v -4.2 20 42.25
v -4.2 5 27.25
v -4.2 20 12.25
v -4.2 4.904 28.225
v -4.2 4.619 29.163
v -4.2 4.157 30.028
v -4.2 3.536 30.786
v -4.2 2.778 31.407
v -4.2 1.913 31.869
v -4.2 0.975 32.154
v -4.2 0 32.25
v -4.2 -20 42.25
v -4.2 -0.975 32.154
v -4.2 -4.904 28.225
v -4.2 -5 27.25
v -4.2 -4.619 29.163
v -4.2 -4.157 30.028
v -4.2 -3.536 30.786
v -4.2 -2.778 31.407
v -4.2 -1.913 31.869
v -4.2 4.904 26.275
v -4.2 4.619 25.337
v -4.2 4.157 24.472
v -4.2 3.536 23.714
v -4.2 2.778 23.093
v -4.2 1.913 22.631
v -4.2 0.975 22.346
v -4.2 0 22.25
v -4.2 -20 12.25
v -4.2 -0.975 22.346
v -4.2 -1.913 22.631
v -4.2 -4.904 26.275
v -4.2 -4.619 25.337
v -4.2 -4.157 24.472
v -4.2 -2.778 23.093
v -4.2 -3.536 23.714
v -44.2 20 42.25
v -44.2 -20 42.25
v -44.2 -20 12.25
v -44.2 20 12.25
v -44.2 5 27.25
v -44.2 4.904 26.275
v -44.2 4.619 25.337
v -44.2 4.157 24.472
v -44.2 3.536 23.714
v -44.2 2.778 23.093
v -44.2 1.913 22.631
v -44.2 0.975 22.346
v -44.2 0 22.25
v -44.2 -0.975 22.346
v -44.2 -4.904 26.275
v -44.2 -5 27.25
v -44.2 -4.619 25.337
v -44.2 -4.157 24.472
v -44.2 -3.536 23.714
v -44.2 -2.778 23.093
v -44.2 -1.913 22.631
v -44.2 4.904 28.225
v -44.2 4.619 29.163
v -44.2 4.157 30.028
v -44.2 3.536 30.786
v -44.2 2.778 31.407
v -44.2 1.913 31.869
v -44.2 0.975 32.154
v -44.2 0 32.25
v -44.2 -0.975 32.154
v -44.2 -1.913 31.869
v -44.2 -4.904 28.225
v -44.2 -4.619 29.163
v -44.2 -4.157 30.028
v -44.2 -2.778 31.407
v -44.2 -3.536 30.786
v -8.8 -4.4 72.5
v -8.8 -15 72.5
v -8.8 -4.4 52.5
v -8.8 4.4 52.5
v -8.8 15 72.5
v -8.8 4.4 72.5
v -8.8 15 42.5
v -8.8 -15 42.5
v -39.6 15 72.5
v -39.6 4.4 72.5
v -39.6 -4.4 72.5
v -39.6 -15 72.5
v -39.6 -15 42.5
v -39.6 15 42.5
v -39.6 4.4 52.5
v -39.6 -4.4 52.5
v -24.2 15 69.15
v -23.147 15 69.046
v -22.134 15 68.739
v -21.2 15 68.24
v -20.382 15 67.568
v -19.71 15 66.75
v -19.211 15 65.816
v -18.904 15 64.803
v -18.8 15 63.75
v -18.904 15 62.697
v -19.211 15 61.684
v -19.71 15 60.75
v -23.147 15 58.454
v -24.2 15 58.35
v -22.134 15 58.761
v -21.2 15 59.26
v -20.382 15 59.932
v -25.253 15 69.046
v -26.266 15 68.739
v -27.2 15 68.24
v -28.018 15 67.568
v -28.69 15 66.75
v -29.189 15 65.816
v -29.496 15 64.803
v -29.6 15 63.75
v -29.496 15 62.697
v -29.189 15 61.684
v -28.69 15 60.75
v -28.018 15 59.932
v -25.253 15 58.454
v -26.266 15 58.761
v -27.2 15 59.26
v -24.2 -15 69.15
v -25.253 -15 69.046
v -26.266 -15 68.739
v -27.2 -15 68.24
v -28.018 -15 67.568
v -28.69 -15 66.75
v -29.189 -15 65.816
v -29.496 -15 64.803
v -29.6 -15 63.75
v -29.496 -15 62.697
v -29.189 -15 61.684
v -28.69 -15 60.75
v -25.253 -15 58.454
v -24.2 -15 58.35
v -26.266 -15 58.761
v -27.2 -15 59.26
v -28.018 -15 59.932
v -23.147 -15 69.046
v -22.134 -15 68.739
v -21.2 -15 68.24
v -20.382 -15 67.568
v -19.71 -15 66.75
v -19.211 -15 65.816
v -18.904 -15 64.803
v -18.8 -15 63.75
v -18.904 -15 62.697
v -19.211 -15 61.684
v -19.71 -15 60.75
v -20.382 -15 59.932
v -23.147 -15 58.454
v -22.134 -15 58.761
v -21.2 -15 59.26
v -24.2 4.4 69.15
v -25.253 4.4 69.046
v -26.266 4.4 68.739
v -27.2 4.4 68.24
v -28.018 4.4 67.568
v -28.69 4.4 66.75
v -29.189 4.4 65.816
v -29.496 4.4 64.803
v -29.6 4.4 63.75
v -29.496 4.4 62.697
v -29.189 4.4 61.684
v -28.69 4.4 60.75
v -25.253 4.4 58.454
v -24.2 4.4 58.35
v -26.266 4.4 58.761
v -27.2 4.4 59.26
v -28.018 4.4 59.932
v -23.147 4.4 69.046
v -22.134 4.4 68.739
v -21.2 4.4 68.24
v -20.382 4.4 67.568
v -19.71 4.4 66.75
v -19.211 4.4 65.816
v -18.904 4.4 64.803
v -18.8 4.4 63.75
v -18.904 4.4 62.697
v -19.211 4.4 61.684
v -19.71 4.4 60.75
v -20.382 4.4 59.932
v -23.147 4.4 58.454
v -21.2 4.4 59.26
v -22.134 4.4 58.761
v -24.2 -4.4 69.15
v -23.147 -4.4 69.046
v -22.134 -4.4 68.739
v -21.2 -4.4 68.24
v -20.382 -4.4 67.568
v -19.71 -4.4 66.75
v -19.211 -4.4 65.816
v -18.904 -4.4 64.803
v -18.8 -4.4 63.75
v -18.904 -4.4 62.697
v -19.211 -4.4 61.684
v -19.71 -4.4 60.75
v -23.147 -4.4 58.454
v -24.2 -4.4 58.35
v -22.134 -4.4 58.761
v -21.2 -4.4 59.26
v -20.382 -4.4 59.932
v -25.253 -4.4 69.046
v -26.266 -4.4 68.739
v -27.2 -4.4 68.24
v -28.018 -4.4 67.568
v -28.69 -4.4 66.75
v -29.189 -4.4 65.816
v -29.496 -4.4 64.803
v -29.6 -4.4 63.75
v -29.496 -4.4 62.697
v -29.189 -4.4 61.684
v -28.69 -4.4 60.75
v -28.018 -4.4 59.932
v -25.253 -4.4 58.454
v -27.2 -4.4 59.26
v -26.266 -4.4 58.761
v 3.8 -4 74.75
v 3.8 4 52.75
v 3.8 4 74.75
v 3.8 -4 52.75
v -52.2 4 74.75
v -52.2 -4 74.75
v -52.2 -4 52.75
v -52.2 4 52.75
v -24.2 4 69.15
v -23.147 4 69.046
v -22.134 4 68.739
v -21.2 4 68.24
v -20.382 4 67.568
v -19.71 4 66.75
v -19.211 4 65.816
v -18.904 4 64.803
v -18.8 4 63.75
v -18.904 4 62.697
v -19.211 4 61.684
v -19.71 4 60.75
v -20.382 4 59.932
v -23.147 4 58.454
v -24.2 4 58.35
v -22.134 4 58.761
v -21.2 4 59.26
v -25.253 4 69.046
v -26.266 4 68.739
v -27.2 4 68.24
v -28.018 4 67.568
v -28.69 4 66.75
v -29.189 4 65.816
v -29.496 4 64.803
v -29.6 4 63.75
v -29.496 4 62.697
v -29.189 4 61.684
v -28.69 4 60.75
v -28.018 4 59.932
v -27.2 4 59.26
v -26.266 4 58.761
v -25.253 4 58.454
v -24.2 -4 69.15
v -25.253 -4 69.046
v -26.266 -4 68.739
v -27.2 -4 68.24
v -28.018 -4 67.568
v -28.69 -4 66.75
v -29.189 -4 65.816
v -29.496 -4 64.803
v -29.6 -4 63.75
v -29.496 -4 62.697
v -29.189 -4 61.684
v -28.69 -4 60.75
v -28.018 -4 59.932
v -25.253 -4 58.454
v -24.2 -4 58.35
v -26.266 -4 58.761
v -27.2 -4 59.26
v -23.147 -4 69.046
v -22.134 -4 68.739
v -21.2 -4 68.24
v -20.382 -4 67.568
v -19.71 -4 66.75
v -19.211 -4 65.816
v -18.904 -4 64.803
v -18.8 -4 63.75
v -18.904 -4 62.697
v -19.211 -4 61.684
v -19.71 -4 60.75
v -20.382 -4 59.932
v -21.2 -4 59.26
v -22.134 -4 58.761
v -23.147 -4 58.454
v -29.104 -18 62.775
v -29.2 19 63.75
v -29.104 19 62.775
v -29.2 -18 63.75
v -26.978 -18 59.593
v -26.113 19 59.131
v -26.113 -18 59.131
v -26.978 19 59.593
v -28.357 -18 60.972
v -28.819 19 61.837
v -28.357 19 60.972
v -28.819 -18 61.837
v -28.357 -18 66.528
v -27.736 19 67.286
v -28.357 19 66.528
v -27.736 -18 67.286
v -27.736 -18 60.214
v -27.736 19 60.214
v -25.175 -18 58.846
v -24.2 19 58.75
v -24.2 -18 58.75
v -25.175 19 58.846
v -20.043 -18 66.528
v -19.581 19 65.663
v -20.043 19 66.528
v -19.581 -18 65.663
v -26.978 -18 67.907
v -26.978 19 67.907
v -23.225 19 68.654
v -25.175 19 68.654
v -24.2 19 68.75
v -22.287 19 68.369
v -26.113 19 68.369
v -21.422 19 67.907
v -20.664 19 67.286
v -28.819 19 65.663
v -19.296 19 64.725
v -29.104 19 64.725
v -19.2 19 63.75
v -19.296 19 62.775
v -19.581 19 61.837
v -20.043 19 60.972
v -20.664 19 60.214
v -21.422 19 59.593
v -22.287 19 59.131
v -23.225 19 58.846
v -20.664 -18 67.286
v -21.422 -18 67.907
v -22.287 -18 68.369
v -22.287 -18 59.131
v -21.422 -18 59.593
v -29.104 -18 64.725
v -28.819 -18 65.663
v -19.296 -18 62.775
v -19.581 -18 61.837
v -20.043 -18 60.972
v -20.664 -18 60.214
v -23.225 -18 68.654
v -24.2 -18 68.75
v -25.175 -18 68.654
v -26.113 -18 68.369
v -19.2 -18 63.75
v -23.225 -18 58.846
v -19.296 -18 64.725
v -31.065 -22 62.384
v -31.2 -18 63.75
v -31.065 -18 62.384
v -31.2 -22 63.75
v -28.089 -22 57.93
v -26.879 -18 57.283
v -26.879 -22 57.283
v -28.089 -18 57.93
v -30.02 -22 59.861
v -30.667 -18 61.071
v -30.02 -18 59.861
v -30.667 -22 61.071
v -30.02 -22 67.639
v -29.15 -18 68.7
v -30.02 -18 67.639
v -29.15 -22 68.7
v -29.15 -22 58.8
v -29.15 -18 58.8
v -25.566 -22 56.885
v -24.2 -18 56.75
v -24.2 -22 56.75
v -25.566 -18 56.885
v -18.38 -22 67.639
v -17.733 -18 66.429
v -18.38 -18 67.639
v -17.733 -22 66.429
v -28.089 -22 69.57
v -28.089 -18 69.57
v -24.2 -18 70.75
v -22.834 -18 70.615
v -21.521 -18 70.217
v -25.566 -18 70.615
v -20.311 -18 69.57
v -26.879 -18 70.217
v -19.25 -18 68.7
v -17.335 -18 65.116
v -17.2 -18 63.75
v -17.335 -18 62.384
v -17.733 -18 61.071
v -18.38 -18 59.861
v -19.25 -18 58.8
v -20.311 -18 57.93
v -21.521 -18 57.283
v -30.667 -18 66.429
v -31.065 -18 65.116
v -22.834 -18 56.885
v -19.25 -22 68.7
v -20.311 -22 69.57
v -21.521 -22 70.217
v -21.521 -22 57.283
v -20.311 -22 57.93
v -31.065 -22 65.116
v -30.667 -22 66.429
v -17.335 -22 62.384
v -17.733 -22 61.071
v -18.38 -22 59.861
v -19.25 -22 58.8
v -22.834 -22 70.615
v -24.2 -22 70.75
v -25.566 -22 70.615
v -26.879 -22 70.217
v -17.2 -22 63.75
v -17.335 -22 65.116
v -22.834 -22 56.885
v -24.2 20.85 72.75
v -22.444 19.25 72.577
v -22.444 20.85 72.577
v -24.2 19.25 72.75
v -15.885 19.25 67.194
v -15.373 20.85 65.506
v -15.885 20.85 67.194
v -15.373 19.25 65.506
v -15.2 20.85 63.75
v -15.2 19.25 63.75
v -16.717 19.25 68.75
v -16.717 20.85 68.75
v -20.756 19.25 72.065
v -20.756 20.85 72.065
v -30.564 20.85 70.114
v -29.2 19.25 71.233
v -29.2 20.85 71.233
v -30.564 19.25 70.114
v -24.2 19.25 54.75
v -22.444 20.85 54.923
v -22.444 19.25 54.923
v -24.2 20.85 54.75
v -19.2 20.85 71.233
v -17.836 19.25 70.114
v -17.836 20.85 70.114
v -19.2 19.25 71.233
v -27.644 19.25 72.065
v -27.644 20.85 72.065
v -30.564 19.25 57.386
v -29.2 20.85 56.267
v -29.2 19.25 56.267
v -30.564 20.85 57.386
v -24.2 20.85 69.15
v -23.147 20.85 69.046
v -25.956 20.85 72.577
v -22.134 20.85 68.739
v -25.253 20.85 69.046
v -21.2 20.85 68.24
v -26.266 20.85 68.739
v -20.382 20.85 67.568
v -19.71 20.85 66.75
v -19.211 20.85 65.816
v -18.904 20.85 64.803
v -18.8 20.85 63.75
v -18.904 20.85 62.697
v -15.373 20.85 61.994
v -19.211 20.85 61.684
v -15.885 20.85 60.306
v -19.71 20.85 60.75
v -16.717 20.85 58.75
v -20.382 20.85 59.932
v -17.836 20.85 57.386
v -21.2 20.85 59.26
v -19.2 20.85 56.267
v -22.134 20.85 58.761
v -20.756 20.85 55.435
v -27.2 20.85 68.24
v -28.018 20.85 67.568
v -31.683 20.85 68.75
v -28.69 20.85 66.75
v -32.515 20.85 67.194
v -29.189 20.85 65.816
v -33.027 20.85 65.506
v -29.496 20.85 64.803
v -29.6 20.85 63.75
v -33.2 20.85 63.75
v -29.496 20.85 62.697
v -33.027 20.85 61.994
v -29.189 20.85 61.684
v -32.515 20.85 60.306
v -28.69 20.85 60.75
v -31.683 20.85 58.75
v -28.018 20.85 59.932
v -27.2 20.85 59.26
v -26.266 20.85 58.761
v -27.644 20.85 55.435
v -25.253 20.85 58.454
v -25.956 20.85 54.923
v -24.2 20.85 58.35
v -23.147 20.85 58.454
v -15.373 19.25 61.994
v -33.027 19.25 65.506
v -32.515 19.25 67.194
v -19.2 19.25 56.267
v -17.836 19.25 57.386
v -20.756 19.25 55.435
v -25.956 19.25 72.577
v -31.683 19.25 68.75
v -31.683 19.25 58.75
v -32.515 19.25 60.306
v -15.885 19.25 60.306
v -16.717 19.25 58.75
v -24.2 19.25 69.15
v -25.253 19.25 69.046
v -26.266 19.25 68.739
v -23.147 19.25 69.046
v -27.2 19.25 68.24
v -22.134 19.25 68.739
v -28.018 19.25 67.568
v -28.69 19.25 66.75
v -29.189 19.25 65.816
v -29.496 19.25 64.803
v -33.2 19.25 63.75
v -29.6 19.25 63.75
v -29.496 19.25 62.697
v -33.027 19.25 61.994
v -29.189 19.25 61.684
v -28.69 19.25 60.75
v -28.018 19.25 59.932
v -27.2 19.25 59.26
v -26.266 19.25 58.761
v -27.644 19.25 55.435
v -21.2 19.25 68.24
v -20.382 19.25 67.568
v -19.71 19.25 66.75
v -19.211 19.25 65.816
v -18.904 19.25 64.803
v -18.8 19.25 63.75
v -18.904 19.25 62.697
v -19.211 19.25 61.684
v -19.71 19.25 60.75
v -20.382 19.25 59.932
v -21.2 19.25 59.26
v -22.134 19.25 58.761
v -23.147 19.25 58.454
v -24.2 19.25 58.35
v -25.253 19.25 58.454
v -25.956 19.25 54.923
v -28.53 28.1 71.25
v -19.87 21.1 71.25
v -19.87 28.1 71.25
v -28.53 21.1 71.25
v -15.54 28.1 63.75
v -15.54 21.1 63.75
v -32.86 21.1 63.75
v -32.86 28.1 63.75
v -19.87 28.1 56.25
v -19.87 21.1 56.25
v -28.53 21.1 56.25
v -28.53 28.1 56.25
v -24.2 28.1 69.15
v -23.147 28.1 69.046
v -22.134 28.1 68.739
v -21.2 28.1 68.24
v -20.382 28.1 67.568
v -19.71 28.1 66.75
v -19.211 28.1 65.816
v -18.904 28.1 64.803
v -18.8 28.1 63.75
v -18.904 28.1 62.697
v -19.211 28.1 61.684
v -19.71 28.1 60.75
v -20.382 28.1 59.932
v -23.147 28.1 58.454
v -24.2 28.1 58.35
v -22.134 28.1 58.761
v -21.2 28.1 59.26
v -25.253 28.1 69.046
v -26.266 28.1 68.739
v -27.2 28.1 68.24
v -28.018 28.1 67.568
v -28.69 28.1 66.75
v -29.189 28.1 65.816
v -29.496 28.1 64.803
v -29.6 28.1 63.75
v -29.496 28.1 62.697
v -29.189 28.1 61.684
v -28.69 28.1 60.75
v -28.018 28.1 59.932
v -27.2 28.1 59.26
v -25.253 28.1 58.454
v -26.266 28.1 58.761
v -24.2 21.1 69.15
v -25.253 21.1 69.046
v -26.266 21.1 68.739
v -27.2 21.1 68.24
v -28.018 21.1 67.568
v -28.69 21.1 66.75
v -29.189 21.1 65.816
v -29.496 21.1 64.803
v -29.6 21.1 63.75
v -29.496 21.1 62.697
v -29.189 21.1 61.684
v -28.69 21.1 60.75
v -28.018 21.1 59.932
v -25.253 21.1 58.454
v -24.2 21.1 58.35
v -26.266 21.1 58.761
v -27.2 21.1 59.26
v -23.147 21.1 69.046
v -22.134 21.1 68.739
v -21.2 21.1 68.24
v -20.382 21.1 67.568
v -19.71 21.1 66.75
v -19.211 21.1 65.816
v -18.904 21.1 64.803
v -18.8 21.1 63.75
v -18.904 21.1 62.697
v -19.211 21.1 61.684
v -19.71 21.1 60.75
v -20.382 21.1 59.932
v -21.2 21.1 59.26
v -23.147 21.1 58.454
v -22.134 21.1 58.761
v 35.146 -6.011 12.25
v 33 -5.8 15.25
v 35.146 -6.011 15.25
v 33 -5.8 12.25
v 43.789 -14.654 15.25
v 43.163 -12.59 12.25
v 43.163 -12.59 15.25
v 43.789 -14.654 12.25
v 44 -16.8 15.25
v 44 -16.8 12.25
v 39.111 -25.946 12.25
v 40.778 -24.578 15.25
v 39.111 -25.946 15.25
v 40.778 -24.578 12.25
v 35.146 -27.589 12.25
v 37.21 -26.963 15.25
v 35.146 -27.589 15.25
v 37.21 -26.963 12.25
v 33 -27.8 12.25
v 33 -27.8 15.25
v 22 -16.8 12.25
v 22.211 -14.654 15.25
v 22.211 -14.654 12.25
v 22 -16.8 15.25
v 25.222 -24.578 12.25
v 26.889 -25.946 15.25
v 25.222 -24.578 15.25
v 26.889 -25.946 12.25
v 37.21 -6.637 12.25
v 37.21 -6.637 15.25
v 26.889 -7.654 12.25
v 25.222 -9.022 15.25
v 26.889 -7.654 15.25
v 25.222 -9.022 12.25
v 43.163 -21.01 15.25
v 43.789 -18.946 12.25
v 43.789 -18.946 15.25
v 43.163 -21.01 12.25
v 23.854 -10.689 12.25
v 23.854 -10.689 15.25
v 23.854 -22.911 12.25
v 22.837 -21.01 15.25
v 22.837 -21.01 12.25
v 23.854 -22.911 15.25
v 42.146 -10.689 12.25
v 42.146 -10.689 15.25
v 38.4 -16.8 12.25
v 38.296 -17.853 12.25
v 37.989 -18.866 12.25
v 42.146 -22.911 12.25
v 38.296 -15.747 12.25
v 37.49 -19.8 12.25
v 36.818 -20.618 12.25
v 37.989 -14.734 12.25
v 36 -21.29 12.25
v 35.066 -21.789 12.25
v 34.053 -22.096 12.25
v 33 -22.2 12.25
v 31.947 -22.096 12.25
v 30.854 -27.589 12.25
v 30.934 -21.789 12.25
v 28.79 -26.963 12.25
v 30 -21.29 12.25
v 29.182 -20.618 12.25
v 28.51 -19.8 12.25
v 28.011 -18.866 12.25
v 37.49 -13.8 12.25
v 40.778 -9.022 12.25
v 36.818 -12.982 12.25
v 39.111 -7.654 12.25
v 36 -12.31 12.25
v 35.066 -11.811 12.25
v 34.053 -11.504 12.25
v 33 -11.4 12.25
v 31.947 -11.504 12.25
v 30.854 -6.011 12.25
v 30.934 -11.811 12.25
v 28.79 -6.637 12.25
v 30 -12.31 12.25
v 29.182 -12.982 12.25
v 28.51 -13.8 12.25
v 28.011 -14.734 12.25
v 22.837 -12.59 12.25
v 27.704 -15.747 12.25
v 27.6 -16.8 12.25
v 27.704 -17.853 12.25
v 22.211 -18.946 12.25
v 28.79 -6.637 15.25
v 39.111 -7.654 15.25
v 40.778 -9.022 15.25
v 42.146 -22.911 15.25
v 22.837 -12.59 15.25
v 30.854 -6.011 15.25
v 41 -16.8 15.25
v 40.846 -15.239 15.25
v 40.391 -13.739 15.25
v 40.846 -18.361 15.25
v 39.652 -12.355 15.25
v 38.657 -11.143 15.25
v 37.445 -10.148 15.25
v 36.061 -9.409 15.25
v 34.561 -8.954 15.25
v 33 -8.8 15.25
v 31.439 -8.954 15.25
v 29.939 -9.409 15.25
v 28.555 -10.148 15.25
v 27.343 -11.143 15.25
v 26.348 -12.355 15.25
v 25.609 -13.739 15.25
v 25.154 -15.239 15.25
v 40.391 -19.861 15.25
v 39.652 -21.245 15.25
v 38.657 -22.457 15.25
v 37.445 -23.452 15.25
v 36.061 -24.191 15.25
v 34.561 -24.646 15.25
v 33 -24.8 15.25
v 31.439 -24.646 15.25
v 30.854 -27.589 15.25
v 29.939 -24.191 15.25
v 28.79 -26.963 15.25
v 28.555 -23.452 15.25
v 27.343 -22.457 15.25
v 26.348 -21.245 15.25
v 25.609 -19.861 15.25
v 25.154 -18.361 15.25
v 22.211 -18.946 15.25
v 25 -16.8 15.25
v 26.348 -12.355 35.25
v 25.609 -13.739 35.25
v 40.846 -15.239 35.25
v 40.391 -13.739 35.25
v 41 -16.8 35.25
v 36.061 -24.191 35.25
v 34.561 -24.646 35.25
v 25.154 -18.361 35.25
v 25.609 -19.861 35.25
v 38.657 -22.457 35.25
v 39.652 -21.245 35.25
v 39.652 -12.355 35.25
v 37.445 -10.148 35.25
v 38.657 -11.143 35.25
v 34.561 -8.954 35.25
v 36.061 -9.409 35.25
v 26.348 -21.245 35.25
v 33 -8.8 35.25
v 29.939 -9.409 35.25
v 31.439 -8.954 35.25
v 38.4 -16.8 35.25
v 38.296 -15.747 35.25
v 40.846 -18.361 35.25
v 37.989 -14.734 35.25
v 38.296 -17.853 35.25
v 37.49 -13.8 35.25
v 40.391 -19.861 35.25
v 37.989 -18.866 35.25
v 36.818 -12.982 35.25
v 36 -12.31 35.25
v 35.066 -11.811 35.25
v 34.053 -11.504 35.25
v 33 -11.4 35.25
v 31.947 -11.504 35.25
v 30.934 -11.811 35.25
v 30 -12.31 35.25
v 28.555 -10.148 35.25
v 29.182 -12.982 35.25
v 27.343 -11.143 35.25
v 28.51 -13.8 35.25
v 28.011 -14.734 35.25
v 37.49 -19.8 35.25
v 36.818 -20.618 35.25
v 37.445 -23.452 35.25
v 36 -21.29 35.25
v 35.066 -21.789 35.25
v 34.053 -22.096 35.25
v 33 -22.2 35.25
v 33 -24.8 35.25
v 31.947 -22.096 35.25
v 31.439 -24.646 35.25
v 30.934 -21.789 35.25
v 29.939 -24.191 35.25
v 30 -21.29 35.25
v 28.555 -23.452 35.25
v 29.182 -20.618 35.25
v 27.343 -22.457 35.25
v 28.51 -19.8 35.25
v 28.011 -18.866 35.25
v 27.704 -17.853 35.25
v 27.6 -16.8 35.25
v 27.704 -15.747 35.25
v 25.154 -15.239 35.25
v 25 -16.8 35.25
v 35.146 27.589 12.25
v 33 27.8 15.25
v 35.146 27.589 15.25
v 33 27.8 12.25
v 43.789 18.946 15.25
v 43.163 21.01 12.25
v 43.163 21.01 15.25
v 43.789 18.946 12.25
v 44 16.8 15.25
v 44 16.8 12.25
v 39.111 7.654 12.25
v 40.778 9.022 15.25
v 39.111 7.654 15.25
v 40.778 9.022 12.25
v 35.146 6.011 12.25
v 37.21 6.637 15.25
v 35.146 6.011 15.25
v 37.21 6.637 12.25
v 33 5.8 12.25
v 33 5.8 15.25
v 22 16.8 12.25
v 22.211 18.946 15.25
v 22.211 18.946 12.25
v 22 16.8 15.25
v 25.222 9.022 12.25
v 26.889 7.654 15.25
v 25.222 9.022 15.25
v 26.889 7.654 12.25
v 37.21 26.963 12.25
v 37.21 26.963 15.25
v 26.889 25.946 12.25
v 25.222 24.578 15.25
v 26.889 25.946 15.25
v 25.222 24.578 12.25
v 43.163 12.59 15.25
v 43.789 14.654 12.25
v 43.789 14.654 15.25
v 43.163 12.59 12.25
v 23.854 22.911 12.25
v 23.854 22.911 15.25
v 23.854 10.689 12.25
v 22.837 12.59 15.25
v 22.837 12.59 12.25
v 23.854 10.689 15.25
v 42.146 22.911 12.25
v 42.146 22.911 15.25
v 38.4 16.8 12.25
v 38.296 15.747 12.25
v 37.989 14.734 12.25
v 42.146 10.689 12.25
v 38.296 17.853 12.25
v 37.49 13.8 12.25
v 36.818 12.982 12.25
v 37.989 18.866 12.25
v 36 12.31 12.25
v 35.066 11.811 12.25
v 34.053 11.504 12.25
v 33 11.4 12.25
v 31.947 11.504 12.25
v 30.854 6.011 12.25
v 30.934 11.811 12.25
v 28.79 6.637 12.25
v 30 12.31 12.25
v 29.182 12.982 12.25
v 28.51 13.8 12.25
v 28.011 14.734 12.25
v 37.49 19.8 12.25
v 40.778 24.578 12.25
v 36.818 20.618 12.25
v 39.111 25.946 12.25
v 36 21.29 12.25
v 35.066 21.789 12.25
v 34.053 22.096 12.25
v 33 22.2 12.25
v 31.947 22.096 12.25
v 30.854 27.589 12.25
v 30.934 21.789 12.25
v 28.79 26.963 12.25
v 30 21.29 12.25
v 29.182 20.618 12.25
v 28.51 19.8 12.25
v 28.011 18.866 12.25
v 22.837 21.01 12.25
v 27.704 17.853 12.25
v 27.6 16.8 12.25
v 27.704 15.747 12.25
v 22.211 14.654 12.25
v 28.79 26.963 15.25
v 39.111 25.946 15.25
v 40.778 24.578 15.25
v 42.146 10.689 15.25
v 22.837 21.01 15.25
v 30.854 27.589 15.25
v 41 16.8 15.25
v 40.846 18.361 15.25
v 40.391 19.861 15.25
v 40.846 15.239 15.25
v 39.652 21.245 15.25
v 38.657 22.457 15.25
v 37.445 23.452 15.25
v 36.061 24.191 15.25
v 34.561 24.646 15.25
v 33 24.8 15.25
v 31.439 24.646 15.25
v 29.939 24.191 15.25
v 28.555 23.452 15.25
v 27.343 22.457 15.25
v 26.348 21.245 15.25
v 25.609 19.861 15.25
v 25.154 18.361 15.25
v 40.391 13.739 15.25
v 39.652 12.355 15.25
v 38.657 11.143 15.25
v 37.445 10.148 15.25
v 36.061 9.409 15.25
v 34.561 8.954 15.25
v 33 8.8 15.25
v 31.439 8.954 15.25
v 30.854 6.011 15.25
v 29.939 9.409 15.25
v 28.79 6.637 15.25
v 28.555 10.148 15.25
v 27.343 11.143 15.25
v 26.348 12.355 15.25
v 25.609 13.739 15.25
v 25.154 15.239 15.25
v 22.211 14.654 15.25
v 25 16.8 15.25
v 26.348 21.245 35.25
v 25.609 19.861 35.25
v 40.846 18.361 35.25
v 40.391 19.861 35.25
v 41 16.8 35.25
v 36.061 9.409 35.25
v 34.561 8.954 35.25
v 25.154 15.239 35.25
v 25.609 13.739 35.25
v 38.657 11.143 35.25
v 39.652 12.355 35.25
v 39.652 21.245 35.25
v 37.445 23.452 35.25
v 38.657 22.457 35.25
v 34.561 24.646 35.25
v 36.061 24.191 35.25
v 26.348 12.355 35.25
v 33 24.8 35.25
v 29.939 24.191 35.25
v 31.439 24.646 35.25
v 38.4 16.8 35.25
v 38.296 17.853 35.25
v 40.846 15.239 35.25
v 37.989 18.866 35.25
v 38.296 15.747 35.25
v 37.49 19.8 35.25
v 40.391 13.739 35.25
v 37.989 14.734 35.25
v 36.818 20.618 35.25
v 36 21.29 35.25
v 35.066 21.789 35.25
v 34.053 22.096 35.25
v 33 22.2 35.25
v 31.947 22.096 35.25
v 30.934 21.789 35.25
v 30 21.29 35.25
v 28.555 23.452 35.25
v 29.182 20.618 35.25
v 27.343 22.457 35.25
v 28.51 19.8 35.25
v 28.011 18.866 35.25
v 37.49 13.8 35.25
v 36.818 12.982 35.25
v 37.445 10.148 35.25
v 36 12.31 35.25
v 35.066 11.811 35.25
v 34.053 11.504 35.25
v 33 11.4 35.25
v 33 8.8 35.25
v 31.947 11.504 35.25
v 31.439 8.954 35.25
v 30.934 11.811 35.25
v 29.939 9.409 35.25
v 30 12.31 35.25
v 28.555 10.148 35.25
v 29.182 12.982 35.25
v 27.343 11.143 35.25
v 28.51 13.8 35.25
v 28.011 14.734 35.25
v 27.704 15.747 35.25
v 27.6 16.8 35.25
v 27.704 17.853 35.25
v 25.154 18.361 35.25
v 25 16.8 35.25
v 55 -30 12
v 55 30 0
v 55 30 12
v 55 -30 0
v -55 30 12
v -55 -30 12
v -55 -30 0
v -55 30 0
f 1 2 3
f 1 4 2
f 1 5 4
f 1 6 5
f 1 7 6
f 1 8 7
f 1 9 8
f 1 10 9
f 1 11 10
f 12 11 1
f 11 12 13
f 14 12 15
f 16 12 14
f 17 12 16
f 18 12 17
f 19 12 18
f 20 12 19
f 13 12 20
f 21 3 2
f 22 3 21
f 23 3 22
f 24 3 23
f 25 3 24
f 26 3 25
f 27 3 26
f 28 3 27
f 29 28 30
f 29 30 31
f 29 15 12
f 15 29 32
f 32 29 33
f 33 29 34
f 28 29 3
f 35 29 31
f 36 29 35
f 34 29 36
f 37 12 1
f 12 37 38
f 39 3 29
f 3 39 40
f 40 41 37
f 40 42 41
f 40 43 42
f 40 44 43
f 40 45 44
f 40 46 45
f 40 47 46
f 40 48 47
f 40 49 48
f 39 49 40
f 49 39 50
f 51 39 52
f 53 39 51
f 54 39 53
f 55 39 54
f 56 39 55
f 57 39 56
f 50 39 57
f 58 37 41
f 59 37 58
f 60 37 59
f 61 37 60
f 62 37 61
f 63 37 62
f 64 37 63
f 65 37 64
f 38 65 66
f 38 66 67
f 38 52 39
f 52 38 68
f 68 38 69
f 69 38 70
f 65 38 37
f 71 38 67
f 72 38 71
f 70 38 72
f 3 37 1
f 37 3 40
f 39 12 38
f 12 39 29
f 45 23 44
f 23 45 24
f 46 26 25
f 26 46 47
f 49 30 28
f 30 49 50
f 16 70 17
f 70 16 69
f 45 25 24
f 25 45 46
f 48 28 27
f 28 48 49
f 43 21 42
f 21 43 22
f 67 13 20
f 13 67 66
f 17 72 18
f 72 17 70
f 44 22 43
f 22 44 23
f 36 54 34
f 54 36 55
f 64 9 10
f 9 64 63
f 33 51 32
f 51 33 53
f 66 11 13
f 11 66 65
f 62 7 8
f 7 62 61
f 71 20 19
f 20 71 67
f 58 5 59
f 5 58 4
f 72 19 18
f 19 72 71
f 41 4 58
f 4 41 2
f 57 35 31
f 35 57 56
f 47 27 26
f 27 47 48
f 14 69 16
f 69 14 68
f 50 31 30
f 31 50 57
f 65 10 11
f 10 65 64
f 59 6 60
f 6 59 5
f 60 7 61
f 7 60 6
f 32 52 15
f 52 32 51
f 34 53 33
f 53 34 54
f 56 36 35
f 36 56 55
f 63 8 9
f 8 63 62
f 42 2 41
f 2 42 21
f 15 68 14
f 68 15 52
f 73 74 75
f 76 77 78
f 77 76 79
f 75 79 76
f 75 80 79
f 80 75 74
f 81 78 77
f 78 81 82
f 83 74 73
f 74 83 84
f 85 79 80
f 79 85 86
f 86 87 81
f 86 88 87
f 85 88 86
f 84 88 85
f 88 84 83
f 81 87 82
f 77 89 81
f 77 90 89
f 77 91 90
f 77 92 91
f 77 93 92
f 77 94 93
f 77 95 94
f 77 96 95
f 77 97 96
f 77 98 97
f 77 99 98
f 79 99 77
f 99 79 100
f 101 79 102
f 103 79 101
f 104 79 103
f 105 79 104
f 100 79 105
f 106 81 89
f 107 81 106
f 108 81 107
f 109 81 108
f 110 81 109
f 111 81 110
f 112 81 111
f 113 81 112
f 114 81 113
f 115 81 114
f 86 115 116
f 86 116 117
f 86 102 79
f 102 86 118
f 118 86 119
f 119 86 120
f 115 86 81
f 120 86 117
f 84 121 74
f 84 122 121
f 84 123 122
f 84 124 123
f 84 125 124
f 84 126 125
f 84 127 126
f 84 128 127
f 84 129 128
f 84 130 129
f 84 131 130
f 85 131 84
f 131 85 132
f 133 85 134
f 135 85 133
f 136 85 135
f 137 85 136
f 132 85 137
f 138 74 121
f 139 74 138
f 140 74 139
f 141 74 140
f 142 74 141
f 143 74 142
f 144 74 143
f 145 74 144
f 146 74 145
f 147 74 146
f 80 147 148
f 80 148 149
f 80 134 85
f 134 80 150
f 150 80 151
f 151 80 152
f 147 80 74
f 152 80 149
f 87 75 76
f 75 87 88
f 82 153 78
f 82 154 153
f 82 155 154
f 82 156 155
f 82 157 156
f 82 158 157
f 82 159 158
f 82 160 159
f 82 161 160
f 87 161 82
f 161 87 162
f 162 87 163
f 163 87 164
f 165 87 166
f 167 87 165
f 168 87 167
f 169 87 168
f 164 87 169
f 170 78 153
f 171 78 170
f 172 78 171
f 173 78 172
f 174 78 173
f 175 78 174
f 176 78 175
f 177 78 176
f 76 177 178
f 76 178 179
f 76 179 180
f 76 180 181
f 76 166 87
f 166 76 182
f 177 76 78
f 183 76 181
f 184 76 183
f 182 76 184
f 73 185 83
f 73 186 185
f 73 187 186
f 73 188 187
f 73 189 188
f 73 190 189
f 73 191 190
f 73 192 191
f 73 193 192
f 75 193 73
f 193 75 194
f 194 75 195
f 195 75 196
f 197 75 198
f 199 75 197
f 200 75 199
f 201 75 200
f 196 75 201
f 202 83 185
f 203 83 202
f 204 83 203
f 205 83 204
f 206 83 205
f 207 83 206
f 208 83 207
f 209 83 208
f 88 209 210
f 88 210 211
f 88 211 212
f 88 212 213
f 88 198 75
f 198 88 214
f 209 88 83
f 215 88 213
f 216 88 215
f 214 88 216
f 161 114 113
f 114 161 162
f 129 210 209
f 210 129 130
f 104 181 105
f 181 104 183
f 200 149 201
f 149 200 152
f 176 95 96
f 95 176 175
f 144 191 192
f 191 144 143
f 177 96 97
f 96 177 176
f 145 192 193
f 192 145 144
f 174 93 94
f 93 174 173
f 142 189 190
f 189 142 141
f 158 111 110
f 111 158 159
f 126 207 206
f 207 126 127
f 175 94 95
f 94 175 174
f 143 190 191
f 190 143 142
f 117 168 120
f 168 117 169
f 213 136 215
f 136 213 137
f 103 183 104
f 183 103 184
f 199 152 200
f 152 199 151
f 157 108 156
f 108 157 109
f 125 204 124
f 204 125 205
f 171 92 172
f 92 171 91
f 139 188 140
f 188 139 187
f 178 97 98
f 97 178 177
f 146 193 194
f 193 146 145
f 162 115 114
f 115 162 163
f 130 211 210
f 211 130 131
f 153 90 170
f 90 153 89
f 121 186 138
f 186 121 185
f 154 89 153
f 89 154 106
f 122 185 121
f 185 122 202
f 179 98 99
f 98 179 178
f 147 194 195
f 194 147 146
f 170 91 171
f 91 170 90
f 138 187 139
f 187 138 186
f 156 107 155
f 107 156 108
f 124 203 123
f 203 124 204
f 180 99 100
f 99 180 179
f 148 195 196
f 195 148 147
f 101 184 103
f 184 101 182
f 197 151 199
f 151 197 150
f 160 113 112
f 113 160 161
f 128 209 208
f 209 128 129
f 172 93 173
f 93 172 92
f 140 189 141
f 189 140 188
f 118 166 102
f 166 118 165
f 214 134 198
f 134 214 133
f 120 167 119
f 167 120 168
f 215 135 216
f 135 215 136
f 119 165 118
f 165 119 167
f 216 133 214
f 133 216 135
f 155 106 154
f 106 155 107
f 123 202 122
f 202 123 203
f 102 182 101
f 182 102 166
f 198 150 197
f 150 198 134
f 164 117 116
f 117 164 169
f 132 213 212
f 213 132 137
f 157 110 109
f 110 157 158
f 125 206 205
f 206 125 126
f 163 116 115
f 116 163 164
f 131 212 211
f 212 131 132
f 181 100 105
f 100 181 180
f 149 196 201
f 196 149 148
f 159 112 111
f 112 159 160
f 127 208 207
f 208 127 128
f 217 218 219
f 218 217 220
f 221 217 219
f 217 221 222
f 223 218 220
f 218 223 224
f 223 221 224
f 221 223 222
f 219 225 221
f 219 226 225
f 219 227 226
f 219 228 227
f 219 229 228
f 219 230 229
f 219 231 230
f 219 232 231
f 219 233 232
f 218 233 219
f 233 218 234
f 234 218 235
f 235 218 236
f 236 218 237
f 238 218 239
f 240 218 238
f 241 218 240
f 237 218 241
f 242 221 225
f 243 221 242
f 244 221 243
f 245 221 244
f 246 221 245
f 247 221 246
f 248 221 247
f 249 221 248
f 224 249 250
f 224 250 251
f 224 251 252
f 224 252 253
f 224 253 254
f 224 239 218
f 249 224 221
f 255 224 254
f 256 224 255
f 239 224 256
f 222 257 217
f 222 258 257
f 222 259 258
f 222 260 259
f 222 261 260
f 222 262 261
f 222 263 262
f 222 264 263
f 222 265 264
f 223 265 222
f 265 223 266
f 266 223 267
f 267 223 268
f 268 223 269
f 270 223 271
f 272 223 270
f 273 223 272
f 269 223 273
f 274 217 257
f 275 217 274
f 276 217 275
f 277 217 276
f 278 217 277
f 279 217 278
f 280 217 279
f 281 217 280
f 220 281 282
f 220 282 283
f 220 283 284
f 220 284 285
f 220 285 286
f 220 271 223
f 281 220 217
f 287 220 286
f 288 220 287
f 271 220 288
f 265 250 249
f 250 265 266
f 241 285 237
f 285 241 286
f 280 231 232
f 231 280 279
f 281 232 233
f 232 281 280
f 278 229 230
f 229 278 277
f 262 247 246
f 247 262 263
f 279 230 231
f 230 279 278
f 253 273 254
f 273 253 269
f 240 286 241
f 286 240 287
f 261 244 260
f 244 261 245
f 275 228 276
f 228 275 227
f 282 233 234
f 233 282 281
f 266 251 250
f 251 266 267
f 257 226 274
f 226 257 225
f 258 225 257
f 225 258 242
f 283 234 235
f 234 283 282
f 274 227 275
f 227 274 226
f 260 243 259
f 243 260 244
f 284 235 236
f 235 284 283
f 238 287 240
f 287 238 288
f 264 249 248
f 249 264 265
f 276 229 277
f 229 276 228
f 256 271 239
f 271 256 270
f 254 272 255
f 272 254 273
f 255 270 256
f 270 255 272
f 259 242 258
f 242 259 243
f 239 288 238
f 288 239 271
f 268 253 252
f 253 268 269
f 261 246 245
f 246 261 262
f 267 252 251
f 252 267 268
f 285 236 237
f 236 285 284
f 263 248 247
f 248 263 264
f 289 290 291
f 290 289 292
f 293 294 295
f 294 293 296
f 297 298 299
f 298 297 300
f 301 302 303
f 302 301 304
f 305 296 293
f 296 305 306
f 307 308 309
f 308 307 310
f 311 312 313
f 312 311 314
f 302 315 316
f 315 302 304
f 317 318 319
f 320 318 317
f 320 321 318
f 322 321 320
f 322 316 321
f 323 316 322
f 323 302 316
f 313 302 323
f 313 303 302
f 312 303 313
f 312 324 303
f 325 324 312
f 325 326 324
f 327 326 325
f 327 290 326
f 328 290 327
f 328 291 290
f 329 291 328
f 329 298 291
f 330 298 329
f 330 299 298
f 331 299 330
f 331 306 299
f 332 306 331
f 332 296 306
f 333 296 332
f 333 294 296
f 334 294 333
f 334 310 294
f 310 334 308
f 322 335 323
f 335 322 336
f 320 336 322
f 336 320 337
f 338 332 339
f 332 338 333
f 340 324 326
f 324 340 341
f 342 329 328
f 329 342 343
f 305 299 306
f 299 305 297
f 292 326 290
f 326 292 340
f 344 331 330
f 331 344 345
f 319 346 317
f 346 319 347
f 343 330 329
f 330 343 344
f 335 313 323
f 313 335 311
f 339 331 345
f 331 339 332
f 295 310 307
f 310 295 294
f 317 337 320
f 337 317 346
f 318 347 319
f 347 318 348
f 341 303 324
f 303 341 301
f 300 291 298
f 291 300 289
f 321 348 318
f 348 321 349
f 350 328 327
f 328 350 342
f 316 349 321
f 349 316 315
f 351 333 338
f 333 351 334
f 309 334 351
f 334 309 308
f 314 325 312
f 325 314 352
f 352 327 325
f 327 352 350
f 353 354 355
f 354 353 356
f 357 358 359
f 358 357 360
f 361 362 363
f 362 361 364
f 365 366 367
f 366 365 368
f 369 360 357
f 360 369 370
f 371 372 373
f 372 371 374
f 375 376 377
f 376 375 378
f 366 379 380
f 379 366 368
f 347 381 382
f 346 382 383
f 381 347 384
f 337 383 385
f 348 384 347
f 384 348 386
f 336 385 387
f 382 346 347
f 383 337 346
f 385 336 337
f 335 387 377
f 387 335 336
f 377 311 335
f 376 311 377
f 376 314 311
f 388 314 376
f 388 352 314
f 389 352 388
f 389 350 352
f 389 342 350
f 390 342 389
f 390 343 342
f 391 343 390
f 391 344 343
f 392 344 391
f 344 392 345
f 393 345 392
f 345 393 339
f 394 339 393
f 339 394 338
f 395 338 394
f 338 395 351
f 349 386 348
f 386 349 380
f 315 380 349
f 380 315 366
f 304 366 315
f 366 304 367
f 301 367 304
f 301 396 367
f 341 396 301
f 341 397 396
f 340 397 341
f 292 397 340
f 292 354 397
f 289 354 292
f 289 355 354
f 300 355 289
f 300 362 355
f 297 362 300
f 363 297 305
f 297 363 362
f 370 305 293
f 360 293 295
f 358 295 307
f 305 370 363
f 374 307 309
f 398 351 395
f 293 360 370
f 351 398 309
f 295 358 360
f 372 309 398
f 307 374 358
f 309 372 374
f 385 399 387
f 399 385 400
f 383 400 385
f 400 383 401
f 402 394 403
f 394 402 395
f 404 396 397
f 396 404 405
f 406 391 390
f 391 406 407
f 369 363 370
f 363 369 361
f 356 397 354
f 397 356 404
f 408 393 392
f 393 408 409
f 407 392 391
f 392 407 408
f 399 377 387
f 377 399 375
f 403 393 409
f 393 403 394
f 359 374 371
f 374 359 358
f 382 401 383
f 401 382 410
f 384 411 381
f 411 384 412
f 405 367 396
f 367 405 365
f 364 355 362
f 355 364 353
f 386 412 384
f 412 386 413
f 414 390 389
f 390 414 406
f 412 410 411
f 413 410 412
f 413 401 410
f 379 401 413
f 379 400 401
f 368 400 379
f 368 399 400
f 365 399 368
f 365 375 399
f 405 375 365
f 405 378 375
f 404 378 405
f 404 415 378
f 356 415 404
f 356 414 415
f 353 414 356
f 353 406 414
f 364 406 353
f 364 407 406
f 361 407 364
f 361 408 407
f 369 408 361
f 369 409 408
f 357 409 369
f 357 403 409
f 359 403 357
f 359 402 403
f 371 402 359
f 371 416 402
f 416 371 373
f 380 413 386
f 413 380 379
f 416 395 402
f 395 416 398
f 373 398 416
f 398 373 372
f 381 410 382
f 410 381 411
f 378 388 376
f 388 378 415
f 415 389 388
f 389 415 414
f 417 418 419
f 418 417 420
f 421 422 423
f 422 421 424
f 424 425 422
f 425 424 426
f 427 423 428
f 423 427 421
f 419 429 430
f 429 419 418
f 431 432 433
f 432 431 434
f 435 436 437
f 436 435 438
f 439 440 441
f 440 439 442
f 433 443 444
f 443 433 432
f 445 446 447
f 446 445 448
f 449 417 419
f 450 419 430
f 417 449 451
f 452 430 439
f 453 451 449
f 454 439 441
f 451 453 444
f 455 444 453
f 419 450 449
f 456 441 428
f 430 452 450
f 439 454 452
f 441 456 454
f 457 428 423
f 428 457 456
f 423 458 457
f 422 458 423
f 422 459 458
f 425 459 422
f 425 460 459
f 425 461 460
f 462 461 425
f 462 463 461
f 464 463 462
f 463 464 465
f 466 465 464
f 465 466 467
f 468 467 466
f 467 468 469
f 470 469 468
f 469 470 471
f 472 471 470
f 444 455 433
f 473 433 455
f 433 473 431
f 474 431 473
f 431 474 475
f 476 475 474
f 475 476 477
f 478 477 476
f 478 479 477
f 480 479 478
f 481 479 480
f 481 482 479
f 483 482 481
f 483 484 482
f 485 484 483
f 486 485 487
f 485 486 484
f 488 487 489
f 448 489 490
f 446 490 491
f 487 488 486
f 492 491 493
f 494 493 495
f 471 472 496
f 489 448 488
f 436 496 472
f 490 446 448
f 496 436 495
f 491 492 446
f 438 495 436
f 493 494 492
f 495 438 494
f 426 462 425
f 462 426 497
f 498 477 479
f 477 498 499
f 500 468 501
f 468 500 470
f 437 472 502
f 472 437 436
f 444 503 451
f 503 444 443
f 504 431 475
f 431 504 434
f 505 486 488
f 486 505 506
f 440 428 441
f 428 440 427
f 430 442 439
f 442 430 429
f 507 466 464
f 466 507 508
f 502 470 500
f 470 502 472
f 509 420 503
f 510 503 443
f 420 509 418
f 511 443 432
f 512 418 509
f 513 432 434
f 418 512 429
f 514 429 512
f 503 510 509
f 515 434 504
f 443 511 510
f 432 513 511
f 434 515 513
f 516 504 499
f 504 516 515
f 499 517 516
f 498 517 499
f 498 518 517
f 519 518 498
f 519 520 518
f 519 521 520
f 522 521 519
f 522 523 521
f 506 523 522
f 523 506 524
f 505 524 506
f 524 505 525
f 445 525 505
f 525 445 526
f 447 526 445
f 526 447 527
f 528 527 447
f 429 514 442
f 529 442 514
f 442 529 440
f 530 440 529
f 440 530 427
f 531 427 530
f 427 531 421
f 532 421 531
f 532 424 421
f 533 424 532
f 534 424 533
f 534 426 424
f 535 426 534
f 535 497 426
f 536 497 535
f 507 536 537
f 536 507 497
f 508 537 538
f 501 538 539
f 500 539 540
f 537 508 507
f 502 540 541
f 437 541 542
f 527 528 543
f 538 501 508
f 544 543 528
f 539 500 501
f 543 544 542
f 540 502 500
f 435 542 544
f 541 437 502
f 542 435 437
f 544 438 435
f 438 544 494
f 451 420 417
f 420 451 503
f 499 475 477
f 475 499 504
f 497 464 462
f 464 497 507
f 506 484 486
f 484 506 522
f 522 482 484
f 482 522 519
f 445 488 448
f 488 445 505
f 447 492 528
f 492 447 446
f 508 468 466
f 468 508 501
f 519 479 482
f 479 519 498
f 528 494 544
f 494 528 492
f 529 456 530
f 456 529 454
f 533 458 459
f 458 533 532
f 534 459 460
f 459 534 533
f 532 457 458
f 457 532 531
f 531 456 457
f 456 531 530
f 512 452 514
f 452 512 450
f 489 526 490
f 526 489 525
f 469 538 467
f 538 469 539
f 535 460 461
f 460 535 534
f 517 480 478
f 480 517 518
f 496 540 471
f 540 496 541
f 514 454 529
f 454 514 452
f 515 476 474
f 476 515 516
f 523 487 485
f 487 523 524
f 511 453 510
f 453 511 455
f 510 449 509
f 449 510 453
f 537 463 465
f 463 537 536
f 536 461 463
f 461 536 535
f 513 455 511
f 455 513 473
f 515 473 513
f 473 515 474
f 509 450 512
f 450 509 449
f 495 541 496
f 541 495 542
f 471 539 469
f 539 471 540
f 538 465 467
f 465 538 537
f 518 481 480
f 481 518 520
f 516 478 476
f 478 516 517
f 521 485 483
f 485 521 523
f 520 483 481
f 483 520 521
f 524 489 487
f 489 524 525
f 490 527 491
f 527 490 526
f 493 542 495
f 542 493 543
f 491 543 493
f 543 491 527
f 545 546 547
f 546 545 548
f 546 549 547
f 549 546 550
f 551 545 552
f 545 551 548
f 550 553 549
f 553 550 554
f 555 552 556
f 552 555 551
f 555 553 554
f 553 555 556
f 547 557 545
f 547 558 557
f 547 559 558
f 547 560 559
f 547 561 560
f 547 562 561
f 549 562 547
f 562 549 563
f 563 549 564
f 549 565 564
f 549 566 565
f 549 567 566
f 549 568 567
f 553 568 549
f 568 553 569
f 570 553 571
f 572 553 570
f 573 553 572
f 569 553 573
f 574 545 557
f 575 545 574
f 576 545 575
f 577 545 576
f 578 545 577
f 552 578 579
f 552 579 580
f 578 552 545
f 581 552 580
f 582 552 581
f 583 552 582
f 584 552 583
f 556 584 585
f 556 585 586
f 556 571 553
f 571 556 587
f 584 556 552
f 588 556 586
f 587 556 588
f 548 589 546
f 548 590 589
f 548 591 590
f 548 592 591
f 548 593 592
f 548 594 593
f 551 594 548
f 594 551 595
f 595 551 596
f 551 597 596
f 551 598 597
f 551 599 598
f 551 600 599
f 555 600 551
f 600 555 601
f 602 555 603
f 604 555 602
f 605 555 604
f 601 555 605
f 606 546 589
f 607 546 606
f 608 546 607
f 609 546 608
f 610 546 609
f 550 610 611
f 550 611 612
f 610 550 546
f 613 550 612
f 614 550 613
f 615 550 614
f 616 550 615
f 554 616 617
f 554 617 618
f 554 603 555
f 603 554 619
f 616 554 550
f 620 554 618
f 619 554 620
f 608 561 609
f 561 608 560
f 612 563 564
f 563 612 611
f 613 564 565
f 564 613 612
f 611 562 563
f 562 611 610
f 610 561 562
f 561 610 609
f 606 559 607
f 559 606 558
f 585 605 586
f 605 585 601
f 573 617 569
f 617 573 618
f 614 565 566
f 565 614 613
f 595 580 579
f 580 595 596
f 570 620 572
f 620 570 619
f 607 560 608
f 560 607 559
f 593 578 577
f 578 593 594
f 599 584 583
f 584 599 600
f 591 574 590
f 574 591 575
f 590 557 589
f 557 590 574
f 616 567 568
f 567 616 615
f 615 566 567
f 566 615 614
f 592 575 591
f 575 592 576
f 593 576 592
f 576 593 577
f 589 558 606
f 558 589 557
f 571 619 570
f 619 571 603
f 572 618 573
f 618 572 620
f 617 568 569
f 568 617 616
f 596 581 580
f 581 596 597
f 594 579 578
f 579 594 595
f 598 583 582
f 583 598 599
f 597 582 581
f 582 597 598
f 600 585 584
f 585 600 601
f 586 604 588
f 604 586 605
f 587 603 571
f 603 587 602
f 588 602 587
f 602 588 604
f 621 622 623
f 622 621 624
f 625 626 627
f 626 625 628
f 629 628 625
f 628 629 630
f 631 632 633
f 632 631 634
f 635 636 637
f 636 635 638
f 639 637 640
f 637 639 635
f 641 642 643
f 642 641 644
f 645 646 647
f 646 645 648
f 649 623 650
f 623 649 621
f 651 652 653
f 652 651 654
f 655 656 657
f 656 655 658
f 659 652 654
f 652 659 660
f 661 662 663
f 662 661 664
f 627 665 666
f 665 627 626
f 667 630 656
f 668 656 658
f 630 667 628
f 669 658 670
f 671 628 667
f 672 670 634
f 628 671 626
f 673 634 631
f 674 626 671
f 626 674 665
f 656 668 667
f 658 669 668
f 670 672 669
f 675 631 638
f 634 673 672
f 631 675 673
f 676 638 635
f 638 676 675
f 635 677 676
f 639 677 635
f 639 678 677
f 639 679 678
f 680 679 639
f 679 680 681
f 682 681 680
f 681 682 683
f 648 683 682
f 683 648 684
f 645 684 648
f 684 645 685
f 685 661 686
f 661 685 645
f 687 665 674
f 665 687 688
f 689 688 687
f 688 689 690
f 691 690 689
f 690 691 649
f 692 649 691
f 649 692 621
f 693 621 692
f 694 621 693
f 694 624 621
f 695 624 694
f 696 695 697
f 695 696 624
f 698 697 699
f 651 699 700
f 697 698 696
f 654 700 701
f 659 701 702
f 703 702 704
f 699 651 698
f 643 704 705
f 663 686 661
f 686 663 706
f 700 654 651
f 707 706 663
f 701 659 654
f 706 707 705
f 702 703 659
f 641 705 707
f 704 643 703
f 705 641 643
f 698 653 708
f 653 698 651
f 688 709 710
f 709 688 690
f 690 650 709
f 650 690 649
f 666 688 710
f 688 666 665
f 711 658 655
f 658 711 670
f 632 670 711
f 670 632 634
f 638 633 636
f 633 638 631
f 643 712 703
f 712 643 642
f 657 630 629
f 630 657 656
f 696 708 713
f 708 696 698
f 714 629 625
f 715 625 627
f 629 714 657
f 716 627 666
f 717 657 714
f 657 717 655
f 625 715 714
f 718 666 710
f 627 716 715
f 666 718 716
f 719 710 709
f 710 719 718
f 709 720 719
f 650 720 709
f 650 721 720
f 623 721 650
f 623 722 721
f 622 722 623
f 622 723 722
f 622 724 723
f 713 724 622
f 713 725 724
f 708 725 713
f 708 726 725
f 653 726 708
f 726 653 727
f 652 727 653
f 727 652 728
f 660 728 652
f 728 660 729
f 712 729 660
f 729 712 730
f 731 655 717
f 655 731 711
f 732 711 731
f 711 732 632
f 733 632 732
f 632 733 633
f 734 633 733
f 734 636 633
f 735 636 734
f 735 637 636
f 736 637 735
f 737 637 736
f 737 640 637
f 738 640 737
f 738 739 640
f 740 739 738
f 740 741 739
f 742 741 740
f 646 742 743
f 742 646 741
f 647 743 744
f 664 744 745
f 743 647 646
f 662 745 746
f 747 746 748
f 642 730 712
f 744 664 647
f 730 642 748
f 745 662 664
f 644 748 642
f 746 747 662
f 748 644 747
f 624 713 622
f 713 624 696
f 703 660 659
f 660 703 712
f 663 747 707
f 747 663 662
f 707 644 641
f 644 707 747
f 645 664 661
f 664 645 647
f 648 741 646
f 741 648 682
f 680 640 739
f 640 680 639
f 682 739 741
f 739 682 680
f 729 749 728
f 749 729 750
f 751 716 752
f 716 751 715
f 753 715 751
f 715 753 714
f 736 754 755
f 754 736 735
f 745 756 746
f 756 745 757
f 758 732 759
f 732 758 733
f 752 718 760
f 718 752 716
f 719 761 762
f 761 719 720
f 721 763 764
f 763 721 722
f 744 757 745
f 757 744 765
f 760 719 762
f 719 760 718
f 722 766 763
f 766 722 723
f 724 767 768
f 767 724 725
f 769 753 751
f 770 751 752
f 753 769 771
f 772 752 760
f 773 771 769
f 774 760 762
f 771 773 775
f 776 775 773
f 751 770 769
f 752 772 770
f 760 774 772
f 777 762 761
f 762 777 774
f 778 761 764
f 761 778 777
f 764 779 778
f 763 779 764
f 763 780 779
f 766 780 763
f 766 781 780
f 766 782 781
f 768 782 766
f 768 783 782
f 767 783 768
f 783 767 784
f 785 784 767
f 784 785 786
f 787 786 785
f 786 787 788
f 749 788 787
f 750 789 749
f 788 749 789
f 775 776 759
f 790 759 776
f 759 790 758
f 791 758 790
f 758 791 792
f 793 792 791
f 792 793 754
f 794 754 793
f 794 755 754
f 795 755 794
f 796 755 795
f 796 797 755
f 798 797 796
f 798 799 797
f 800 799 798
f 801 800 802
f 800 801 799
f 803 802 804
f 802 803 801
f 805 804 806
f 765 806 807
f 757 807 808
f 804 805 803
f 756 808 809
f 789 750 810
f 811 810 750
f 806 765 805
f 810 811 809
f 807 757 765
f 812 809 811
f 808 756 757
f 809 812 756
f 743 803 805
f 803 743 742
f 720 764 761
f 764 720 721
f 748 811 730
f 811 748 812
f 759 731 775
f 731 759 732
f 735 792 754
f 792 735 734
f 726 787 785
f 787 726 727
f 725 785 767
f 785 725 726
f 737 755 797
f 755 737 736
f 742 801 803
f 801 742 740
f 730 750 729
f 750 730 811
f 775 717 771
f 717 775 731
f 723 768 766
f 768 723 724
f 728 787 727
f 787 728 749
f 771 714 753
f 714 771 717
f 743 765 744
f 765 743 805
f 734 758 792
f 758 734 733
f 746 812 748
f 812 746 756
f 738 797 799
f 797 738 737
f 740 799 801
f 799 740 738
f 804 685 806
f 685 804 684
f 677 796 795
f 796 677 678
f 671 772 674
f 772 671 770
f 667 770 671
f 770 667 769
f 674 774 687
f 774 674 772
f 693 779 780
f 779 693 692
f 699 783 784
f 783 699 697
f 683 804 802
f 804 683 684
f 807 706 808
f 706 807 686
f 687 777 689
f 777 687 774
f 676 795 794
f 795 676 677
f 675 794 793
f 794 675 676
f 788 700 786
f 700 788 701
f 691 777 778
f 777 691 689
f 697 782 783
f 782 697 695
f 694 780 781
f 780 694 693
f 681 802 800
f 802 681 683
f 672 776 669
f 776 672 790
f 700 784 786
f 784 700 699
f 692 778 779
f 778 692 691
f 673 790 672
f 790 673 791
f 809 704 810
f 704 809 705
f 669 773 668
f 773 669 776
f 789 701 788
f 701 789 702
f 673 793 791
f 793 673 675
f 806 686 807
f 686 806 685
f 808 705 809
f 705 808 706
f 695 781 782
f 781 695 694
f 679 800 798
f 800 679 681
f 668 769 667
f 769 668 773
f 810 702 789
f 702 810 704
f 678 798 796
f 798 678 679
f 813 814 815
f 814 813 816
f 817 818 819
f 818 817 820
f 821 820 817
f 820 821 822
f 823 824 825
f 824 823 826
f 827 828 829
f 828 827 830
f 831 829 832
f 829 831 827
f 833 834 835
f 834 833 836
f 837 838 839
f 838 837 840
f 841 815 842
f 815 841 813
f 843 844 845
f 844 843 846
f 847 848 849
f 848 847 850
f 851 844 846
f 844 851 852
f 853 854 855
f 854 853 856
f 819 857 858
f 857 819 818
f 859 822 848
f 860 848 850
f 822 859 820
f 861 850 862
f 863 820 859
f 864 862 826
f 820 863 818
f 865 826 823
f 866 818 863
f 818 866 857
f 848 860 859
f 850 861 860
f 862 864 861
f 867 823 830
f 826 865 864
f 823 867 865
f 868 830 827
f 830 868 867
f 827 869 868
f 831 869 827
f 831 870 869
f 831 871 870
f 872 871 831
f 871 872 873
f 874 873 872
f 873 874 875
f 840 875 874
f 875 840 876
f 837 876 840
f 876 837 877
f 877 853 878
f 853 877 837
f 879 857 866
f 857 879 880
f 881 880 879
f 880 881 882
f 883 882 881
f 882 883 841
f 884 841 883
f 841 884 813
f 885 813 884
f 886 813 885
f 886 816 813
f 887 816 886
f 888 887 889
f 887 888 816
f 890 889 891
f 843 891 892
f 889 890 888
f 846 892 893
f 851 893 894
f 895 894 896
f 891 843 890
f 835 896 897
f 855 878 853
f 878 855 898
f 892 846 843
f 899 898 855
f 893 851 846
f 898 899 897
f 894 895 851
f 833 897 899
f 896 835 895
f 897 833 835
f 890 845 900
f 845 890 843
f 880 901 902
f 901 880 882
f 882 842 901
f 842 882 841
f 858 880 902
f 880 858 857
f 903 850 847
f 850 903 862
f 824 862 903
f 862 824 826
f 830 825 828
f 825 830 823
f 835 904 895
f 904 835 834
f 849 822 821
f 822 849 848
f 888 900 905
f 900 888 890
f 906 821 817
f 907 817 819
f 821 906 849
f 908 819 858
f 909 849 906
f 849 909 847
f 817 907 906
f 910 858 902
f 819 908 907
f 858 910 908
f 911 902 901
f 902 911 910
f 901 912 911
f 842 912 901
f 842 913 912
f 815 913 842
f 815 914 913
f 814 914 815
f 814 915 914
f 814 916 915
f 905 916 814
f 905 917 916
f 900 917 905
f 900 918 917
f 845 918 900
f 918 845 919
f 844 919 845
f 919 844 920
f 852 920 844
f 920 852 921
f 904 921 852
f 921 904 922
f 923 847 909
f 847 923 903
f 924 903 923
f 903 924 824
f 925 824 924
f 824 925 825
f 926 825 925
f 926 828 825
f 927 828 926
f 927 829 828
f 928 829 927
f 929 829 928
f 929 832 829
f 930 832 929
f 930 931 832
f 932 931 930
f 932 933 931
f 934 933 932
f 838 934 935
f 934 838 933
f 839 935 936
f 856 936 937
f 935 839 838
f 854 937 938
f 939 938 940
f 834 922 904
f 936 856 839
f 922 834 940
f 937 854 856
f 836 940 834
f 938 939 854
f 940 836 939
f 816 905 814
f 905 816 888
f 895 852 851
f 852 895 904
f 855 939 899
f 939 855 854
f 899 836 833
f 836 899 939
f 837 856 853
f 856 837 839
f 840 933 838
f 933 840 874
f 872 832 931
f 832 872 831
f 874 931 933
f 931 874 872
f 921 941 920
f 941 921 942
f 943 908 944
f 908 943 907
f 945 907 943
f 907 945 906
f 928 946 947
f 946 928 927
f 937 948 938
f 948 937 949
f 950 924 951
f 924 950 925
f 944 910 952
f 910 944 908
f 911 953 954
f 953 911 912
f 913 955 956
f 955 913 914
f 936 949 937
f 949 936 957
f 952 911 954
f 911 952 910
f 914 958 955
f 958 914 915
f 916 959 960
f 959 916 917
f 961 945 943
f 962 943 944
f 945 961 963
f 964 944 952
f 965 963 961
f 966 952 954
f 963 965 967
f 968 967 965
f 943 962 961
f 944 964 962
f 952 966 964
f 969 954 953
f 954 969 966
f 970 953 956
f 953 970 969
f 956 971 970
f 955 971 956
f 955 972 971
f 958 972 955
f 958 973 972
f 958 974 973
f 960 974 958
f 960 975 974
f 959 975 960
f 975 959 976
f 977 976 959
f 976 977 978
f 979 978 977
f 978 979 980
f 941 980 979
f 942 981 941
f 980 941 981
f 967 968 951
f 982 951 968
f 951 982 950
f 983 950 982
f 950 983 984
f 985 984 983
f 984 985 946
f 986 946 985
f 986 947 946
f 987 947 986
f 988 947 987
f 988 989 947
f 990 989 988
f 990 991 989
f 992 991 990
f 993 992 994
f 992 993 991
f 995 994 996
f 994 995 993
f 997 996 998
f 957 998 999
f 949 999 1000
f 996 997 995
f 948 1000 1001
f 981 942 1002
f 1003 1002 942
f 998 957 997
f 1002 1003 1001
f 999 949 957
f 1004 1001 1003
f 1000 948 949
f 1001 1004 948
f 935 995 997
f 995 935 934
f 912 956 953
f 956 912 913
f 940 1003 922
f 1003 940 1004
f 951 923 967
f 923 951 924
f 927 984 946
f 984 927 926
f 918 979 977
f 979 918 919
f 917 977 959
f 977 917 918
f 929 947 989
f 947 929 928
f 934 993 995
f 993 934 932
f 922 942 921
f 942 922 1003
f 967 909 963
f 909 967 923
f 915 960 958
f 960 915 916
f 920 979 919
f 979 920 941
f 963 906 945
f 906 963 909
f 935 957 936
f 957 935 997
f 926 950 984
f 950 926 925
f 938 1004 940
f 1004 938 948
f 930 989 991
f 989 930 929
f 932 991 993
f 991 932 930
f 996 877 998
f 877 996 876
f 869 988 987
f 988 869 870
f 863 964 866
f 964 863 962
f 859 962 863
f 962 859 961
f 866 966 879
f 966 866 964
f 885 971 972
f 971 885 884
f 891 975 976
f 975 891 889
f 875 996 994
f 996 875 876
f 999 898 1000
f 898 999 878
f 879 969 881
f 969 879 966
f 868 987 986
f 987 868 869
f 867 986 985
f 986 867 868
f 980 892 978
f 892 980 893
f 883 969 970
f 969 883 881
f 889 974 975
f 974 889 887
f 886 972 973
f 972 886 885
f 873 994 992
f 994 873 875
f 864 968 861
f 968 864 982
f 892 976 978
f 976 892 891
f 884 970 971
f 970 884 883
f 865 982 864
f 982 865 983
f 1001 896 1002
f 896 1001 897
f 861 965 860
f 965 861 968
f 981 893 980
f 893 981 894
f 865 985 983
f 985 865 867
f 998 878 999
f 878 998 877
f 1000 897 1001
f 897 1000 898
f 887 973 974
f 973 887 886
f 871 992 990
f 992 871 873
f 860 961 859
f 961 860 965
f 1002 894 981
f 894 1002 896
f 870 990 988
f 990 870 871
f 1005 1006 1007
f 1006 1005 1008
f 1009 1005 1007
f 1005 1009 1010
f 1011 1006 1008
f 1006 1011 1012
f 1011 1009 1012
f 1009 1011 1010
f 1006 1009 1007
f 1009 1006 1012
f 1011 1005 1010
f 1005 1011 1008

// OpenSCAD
$fn = 32;

// ------------------------------------------------------------------------
// Indexing jig: plate 110 x 60 mm, pin d10
// Every part is its own module, assembly() places every instance.
// ------------------------------------------------------------------------

// --- part 1 ---
module jig_plate() {
  difference() {
    translate([-55, -30, 0]) cube([110, 60, 12]);
  }
}

// --- part 2 ---
module locator_block() {
  difference() {
    translate([-20, -20, 0]) cube([40, 40, 30]);
    translate([0, 0, 15]) rotate([0, 90, 0]) cylinder(h = 42, d = 10, center = true);
  }
}

// --- part 3 ---
module index_fork() {
  difference() {
    translate([-15.4, -15, 0]) cube([30.8, 30, 30]);
    translate([-16.4, -4.4, 10]) cube([32.8, 8.8, 21]);
    translate([0, 0, 21.25]) rotate([90, 0, 0]) cylinder(h = 32, d = 10.8, center = true);
  }
}

// --- part 4 ---
module index_arm() {
  difference() {
    translate([-28, -4, 0]) cube([56, 8, 22]);
    translate([0, 0, 11]) rotate([90, 0, 0]) cylinder(h = 10, d = 10.8, center = true);
  }
}

// --- part 5 ---
module index_pin() {
  rotate([0, 90, 0]) cylinder(h = 38, d = 10, center = true);
  translate([-22, 0, 0]) rotate([0, 90, 0]) cylinder(h = 4, d = 14);
}

// --- part 6 ---
module pin_washer() {
  difference() {
      translate([0, 0, 0]) cylinder(h = 1.6, d = 18);
      translate([0, 0, -1]) cylinder(h = 3.6, d = 10.8);
    }
}

// --- part 7 ---
module lock_nut() {
  difference() {
    linear_extrude(height = 7) polygon(points = [[8.66, 0], [4.33, 7.5], [-4.33, 7.5], [-8.66, 0], [-4.33, -7.5], [4.33, -7.5]]);
    translate([0, 0, -1]) cylinder(h = 9, d = 10.8);
  }
}

// --- part 8 ---
module guide_bush_a() {
  difference() {
    union() {
      cylinder(h = 3, d = 22);
      translate([0, 0, 3]) cylinder(h = 20, d = 16);
    }
    translate([0, 0, -1]) cylinder(h = 25, d = 10.8);
  }
}

// --- part 9 ---
module guide_bush_b() {
  difference() {
    union() {
      cylinder(h = 3, d = 22);
      translate([0, 0, 3]) cylinder(h = 20, d = 16);
    }
    translate([0, 0, -1]) cylinder(h = 25, d = 10.8);
  }
}

// --- assembly ---
module assembly() {
  color([0.80, 0.24, 0.20]) translate([0, 0, 0]) rotate([0, 0, 0]) jig_plate();
  color([0.20, 0.45, 0.75]) translate([-24.2, 0, 12.25]) rotate([0, 0, 0]) locator_block();
  color([0.25, 0.62, 0.32]) translate([-24.2, 0, 42.5]) rotate([0, 0, 0]) index_fork();
  color([0.92, 0.70, 0.18]) translate([-24.2, 0, 52.75]) rotate([0, 0, 0]) index_arm();
  color([0.58, 0.35, 0.70]) translate([-24.2, 0, 63.75]) rotate([0, 0, 90]) index_pin();
  color([0.16, 0.66, 0.66]) translate([-24.2, 20.85, 63.75]) rotate([90, 0, 0]) pin_washer();
  color([0.85, 0.48, 0.18]) translate([-24.2, 28.1, 63.75]) rotate([90, 0, 0]) lock_nut();
  color([0.55, 0.60, 0.65]) translate([33, -16.8, 12.25]) rotate([0, 0, 0]) guide_bush_a();
  color([0.75, 0.30, 0.55]) translate([33, 16.8, 12.25]) rotate([0, 0, 0]) guide_bush_b();
}

assembly();
